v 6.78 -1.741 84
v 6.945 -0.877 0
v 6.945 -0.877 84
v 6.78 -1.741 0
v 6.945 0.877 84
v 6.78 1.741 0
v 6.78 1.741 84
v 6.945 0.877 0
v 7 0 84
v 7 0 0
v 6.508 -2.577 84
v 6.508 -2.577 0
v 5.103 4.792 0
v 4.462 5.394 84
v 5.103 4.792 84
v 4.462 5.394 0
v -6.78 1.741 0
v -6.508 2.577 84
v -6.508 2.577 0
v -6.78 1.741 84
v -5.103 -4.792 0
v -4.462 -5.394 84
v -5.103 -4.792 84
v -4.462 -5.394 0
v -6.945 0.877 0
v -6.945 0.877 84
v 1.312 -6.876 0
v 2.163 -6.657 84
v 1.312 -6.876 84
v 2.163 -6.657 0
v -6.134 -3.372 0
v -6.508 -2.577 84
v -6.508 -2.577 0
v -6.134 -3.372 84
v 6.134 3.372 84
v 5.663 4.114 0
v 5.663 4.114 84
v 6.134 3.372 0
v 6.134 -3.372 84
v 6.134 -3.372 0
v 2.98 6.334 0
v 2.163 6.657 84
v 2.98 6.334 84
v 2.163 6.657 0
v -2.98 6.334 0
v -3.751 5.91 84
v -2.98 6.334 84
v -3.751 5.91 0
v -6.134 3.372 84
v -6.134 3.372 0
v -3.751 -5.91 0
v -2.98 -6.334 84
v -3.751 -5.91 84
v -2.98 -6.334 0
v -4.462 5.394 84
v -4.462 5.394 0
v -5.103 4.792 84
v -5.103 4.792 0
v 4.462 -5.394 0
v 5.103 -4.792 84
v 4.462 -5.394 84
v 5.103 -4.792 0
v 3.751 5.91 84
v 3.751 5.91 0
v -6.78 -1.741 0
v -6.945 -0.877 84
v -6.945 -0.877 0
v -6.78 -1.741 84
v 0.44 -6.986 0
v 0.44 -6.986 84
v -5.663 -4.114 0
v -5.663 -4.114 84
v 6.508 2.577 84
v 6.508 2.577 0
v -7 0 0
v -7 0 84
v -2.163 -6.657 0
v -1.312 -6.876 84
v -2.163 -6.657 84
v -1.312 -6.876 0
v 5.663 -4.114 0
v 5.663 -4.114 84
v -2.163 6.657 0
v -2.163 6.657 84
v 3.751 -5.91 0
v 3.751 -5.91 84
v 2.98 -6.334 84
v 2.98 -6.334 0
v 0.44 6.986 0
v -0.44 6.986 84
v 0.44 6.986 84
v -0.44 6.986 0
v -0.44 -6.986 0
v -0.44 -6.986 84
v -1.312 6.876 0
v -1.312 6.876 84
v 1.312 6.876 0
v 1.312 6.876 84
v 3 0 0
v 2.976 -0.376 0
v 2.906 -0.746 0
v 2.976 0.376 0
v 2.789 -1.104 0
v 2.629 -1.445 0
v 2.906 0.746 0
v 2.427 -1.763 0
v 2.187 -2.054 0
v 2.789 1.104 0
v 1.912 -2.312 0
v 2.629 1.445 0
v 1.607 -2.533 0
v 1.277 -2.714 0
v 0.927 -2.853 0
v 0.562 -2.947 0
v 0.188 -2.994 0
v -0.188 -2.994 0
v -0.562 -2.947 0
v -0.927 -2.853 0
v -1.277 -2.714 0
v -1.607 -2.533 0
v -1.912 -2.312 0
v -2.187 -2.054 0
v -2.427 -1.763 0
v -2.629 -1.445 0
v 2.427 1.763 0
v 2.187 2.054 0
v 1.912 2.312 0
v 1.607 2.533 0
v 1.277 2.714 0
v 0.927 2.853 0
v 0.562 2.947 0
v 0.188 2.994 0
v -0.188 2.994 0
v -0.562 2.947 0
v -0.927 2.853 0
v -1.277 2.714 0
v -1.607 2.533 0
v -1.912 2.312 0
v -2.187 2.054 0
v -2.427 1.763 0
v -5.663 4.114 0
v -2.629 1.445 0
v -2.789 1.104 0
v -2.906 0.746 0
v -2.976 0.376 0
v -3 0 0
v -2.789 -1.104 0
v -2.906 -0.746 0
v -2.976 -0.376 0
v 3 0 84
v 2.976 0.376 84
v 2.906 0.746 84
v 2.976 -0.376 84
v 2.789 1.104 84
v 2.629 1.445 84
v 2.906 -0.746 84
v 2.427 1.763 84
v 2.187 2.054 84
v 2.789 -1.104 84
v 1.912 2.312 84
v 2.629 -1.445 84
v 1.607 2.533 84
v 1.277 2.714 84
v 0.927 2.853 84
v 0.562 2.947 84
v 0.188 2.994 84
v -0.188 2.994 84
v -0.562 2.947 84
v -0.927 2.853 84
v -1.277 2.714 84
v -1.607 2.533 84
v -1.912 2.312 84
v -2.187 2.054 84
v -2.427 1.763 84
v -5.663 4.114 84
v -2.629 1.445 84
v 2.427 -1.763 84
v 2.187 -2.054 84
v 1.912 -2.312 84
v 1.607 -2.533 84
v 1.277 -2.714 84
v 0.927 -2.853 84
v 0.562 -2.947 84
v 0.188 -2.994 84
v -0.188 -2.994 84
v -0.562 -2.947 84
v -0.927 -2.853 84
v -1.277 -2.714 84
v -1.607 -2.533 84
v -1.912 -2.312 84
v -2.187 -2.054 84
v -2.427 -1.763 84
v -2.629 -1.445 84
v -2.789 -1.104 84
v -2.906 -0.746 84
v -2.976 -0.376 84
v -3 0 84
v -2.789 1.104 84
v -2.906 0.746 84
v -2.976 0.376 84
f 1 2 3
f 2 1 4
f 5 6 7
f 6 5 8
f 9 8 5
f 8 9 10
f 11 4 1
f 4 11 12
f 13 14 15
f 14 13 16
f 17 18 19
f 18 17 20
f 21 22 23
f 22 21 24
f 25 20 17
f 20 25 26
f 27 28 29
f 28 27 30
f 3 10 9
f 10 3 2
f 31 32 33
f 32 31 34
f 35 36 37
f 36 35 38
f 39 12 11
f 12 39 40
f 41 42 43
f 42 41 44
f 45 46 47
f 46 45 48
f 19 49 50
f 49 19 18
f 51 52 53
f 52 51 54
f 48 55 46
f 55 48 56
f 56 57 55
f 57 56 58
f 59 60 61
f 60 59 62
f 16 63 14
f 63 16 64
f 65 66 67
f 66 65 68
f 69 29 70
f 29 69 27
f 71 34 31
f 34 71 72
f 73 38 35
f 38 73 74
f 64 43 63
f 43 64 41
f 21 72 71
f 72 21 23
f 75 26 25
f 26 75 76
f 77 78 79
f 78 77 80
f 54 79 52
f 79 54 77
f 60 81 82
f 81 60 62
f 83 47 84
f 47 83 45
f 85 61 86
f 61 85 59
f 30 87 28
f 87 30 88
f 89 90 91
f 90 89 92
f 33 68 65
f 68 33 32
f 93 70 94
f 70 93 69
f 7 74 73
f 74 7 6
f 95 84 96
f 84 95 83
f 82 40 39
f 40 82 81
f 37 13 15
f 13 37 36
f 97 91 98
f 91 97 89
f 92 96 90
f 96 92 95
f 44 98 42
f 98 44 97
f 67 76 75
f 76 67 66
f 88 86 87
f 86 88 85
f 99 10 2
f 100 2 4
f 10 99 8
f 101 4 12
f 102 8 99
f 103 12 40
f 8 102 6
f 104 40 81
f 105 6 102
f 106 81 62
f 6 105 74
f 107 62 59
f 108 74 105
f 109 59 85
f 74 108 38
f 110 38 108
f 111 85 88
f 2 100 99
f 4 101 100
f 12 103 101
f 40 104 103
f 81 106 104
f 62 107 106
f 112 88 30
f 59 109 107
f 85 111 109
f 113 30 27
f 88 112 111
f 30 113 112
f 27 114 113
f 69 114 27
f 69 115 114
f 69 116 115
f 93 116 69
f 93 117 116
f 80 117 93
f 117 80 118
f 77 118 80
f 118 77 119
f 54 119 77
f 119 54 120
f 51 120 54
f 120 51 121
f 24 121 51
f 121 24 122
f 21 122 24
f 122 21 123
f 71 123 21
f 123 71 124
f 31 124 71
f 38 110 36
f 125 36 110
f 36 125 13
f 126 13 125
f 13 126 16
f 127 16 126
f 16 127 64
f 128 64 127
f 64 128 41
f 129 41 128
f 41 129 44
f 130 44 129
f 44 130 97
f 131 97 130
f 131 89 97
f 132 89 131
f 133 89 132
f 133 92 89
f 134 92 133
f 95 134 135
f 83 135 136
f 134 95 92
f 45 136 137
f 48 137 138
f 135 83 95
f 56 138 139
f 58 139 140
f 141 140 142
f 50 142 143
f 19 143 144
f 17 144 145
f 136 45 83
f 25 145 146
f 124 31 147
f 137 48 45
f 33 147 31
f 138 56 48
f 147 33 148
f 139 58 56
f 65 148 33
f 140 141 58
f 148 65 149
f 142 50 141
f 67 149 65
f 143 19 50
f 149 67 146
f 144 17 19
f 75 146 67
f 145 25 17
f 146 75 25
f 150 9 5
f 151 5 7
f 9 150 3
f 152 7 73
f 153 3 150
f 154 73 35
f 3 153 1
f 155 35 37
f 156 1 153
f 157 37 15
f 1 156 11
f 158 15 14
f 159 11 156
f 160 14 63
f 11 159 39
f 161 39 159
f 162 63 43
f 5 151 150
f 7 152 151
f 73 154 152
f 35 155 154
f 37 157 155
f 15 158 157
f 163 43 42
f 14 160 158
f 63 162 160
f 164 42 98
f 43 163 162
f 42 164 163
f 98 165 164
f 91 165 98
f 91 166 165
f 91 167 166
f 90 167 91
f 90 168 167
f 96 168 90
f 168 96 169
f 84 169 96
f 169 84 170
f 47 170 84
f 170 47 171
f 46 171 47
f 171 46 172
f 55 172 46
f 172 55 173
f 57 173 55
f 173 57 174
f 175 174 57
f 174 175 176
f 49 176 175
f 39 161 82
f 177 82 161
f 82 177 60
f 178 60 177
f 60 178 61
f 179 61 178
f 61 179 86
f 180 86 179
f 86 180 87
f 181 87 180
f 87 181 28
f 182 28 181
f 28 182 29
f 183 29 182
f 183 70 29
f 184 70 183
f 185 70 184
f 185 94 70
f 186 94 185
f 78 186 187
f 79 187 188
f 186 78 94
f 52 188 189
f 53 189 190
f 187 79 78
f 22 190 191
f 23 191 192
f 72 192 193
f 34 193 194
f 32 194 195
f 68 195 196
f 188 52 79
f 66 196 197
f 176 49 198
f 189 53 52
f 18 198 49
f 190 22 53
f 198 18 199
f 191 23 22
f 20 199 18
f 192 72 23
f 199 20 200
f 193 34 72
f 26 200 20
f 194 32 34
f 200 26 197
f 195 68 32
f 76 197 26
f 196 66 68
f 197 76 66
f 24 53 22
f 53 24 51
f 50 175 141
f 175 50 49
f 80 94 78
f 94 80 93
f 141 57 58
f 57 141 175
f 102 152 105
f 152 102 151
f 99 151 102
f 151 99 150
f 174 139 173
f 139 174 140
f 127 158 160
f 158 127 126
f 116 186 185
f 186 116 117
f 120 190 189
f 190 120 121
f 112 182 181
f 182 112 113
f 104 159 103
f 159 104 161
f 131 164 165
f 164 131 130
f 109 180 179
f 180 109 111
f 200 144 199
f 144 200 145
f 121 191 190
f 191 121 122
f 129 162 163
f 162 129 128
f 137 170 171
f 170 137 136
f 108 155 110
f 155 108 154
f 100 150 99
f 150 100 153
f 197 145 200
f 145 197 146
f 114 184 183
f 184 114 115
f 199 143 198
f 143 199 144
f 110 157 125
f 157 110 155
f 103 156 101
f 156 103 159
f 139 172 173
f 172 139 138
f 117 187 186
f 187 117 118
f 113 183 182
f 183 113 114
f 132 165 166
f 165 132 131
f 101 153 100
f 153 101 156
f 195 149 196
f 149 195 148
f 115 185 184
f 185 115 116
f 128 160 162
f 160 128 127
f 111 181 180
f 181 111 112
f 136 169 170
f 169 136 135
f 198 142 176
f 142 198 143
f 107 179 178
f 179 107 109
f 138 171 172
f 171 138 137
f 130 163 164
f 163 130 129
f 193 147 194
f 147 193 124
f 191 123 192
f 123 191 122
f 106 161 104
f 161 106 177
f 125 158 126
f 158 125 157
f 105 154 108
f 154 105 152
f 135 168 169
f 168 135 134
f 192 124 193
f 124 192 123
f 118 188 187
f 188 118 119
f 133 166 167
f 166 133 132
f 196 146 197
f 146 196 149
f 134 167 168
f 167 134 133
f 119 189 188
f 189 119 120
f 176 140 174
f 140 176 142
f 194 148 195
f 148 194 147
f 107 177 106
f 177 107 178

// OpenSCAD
$fn = 50;


difference() {
	union() {
		cylinder(h = 84, r = 7.0000000000);
	}
	union() {
		translate(v = [0, 0, -100]) {
			cylinder(h = 200, r = 3.0000000000);
		}
	}
}
